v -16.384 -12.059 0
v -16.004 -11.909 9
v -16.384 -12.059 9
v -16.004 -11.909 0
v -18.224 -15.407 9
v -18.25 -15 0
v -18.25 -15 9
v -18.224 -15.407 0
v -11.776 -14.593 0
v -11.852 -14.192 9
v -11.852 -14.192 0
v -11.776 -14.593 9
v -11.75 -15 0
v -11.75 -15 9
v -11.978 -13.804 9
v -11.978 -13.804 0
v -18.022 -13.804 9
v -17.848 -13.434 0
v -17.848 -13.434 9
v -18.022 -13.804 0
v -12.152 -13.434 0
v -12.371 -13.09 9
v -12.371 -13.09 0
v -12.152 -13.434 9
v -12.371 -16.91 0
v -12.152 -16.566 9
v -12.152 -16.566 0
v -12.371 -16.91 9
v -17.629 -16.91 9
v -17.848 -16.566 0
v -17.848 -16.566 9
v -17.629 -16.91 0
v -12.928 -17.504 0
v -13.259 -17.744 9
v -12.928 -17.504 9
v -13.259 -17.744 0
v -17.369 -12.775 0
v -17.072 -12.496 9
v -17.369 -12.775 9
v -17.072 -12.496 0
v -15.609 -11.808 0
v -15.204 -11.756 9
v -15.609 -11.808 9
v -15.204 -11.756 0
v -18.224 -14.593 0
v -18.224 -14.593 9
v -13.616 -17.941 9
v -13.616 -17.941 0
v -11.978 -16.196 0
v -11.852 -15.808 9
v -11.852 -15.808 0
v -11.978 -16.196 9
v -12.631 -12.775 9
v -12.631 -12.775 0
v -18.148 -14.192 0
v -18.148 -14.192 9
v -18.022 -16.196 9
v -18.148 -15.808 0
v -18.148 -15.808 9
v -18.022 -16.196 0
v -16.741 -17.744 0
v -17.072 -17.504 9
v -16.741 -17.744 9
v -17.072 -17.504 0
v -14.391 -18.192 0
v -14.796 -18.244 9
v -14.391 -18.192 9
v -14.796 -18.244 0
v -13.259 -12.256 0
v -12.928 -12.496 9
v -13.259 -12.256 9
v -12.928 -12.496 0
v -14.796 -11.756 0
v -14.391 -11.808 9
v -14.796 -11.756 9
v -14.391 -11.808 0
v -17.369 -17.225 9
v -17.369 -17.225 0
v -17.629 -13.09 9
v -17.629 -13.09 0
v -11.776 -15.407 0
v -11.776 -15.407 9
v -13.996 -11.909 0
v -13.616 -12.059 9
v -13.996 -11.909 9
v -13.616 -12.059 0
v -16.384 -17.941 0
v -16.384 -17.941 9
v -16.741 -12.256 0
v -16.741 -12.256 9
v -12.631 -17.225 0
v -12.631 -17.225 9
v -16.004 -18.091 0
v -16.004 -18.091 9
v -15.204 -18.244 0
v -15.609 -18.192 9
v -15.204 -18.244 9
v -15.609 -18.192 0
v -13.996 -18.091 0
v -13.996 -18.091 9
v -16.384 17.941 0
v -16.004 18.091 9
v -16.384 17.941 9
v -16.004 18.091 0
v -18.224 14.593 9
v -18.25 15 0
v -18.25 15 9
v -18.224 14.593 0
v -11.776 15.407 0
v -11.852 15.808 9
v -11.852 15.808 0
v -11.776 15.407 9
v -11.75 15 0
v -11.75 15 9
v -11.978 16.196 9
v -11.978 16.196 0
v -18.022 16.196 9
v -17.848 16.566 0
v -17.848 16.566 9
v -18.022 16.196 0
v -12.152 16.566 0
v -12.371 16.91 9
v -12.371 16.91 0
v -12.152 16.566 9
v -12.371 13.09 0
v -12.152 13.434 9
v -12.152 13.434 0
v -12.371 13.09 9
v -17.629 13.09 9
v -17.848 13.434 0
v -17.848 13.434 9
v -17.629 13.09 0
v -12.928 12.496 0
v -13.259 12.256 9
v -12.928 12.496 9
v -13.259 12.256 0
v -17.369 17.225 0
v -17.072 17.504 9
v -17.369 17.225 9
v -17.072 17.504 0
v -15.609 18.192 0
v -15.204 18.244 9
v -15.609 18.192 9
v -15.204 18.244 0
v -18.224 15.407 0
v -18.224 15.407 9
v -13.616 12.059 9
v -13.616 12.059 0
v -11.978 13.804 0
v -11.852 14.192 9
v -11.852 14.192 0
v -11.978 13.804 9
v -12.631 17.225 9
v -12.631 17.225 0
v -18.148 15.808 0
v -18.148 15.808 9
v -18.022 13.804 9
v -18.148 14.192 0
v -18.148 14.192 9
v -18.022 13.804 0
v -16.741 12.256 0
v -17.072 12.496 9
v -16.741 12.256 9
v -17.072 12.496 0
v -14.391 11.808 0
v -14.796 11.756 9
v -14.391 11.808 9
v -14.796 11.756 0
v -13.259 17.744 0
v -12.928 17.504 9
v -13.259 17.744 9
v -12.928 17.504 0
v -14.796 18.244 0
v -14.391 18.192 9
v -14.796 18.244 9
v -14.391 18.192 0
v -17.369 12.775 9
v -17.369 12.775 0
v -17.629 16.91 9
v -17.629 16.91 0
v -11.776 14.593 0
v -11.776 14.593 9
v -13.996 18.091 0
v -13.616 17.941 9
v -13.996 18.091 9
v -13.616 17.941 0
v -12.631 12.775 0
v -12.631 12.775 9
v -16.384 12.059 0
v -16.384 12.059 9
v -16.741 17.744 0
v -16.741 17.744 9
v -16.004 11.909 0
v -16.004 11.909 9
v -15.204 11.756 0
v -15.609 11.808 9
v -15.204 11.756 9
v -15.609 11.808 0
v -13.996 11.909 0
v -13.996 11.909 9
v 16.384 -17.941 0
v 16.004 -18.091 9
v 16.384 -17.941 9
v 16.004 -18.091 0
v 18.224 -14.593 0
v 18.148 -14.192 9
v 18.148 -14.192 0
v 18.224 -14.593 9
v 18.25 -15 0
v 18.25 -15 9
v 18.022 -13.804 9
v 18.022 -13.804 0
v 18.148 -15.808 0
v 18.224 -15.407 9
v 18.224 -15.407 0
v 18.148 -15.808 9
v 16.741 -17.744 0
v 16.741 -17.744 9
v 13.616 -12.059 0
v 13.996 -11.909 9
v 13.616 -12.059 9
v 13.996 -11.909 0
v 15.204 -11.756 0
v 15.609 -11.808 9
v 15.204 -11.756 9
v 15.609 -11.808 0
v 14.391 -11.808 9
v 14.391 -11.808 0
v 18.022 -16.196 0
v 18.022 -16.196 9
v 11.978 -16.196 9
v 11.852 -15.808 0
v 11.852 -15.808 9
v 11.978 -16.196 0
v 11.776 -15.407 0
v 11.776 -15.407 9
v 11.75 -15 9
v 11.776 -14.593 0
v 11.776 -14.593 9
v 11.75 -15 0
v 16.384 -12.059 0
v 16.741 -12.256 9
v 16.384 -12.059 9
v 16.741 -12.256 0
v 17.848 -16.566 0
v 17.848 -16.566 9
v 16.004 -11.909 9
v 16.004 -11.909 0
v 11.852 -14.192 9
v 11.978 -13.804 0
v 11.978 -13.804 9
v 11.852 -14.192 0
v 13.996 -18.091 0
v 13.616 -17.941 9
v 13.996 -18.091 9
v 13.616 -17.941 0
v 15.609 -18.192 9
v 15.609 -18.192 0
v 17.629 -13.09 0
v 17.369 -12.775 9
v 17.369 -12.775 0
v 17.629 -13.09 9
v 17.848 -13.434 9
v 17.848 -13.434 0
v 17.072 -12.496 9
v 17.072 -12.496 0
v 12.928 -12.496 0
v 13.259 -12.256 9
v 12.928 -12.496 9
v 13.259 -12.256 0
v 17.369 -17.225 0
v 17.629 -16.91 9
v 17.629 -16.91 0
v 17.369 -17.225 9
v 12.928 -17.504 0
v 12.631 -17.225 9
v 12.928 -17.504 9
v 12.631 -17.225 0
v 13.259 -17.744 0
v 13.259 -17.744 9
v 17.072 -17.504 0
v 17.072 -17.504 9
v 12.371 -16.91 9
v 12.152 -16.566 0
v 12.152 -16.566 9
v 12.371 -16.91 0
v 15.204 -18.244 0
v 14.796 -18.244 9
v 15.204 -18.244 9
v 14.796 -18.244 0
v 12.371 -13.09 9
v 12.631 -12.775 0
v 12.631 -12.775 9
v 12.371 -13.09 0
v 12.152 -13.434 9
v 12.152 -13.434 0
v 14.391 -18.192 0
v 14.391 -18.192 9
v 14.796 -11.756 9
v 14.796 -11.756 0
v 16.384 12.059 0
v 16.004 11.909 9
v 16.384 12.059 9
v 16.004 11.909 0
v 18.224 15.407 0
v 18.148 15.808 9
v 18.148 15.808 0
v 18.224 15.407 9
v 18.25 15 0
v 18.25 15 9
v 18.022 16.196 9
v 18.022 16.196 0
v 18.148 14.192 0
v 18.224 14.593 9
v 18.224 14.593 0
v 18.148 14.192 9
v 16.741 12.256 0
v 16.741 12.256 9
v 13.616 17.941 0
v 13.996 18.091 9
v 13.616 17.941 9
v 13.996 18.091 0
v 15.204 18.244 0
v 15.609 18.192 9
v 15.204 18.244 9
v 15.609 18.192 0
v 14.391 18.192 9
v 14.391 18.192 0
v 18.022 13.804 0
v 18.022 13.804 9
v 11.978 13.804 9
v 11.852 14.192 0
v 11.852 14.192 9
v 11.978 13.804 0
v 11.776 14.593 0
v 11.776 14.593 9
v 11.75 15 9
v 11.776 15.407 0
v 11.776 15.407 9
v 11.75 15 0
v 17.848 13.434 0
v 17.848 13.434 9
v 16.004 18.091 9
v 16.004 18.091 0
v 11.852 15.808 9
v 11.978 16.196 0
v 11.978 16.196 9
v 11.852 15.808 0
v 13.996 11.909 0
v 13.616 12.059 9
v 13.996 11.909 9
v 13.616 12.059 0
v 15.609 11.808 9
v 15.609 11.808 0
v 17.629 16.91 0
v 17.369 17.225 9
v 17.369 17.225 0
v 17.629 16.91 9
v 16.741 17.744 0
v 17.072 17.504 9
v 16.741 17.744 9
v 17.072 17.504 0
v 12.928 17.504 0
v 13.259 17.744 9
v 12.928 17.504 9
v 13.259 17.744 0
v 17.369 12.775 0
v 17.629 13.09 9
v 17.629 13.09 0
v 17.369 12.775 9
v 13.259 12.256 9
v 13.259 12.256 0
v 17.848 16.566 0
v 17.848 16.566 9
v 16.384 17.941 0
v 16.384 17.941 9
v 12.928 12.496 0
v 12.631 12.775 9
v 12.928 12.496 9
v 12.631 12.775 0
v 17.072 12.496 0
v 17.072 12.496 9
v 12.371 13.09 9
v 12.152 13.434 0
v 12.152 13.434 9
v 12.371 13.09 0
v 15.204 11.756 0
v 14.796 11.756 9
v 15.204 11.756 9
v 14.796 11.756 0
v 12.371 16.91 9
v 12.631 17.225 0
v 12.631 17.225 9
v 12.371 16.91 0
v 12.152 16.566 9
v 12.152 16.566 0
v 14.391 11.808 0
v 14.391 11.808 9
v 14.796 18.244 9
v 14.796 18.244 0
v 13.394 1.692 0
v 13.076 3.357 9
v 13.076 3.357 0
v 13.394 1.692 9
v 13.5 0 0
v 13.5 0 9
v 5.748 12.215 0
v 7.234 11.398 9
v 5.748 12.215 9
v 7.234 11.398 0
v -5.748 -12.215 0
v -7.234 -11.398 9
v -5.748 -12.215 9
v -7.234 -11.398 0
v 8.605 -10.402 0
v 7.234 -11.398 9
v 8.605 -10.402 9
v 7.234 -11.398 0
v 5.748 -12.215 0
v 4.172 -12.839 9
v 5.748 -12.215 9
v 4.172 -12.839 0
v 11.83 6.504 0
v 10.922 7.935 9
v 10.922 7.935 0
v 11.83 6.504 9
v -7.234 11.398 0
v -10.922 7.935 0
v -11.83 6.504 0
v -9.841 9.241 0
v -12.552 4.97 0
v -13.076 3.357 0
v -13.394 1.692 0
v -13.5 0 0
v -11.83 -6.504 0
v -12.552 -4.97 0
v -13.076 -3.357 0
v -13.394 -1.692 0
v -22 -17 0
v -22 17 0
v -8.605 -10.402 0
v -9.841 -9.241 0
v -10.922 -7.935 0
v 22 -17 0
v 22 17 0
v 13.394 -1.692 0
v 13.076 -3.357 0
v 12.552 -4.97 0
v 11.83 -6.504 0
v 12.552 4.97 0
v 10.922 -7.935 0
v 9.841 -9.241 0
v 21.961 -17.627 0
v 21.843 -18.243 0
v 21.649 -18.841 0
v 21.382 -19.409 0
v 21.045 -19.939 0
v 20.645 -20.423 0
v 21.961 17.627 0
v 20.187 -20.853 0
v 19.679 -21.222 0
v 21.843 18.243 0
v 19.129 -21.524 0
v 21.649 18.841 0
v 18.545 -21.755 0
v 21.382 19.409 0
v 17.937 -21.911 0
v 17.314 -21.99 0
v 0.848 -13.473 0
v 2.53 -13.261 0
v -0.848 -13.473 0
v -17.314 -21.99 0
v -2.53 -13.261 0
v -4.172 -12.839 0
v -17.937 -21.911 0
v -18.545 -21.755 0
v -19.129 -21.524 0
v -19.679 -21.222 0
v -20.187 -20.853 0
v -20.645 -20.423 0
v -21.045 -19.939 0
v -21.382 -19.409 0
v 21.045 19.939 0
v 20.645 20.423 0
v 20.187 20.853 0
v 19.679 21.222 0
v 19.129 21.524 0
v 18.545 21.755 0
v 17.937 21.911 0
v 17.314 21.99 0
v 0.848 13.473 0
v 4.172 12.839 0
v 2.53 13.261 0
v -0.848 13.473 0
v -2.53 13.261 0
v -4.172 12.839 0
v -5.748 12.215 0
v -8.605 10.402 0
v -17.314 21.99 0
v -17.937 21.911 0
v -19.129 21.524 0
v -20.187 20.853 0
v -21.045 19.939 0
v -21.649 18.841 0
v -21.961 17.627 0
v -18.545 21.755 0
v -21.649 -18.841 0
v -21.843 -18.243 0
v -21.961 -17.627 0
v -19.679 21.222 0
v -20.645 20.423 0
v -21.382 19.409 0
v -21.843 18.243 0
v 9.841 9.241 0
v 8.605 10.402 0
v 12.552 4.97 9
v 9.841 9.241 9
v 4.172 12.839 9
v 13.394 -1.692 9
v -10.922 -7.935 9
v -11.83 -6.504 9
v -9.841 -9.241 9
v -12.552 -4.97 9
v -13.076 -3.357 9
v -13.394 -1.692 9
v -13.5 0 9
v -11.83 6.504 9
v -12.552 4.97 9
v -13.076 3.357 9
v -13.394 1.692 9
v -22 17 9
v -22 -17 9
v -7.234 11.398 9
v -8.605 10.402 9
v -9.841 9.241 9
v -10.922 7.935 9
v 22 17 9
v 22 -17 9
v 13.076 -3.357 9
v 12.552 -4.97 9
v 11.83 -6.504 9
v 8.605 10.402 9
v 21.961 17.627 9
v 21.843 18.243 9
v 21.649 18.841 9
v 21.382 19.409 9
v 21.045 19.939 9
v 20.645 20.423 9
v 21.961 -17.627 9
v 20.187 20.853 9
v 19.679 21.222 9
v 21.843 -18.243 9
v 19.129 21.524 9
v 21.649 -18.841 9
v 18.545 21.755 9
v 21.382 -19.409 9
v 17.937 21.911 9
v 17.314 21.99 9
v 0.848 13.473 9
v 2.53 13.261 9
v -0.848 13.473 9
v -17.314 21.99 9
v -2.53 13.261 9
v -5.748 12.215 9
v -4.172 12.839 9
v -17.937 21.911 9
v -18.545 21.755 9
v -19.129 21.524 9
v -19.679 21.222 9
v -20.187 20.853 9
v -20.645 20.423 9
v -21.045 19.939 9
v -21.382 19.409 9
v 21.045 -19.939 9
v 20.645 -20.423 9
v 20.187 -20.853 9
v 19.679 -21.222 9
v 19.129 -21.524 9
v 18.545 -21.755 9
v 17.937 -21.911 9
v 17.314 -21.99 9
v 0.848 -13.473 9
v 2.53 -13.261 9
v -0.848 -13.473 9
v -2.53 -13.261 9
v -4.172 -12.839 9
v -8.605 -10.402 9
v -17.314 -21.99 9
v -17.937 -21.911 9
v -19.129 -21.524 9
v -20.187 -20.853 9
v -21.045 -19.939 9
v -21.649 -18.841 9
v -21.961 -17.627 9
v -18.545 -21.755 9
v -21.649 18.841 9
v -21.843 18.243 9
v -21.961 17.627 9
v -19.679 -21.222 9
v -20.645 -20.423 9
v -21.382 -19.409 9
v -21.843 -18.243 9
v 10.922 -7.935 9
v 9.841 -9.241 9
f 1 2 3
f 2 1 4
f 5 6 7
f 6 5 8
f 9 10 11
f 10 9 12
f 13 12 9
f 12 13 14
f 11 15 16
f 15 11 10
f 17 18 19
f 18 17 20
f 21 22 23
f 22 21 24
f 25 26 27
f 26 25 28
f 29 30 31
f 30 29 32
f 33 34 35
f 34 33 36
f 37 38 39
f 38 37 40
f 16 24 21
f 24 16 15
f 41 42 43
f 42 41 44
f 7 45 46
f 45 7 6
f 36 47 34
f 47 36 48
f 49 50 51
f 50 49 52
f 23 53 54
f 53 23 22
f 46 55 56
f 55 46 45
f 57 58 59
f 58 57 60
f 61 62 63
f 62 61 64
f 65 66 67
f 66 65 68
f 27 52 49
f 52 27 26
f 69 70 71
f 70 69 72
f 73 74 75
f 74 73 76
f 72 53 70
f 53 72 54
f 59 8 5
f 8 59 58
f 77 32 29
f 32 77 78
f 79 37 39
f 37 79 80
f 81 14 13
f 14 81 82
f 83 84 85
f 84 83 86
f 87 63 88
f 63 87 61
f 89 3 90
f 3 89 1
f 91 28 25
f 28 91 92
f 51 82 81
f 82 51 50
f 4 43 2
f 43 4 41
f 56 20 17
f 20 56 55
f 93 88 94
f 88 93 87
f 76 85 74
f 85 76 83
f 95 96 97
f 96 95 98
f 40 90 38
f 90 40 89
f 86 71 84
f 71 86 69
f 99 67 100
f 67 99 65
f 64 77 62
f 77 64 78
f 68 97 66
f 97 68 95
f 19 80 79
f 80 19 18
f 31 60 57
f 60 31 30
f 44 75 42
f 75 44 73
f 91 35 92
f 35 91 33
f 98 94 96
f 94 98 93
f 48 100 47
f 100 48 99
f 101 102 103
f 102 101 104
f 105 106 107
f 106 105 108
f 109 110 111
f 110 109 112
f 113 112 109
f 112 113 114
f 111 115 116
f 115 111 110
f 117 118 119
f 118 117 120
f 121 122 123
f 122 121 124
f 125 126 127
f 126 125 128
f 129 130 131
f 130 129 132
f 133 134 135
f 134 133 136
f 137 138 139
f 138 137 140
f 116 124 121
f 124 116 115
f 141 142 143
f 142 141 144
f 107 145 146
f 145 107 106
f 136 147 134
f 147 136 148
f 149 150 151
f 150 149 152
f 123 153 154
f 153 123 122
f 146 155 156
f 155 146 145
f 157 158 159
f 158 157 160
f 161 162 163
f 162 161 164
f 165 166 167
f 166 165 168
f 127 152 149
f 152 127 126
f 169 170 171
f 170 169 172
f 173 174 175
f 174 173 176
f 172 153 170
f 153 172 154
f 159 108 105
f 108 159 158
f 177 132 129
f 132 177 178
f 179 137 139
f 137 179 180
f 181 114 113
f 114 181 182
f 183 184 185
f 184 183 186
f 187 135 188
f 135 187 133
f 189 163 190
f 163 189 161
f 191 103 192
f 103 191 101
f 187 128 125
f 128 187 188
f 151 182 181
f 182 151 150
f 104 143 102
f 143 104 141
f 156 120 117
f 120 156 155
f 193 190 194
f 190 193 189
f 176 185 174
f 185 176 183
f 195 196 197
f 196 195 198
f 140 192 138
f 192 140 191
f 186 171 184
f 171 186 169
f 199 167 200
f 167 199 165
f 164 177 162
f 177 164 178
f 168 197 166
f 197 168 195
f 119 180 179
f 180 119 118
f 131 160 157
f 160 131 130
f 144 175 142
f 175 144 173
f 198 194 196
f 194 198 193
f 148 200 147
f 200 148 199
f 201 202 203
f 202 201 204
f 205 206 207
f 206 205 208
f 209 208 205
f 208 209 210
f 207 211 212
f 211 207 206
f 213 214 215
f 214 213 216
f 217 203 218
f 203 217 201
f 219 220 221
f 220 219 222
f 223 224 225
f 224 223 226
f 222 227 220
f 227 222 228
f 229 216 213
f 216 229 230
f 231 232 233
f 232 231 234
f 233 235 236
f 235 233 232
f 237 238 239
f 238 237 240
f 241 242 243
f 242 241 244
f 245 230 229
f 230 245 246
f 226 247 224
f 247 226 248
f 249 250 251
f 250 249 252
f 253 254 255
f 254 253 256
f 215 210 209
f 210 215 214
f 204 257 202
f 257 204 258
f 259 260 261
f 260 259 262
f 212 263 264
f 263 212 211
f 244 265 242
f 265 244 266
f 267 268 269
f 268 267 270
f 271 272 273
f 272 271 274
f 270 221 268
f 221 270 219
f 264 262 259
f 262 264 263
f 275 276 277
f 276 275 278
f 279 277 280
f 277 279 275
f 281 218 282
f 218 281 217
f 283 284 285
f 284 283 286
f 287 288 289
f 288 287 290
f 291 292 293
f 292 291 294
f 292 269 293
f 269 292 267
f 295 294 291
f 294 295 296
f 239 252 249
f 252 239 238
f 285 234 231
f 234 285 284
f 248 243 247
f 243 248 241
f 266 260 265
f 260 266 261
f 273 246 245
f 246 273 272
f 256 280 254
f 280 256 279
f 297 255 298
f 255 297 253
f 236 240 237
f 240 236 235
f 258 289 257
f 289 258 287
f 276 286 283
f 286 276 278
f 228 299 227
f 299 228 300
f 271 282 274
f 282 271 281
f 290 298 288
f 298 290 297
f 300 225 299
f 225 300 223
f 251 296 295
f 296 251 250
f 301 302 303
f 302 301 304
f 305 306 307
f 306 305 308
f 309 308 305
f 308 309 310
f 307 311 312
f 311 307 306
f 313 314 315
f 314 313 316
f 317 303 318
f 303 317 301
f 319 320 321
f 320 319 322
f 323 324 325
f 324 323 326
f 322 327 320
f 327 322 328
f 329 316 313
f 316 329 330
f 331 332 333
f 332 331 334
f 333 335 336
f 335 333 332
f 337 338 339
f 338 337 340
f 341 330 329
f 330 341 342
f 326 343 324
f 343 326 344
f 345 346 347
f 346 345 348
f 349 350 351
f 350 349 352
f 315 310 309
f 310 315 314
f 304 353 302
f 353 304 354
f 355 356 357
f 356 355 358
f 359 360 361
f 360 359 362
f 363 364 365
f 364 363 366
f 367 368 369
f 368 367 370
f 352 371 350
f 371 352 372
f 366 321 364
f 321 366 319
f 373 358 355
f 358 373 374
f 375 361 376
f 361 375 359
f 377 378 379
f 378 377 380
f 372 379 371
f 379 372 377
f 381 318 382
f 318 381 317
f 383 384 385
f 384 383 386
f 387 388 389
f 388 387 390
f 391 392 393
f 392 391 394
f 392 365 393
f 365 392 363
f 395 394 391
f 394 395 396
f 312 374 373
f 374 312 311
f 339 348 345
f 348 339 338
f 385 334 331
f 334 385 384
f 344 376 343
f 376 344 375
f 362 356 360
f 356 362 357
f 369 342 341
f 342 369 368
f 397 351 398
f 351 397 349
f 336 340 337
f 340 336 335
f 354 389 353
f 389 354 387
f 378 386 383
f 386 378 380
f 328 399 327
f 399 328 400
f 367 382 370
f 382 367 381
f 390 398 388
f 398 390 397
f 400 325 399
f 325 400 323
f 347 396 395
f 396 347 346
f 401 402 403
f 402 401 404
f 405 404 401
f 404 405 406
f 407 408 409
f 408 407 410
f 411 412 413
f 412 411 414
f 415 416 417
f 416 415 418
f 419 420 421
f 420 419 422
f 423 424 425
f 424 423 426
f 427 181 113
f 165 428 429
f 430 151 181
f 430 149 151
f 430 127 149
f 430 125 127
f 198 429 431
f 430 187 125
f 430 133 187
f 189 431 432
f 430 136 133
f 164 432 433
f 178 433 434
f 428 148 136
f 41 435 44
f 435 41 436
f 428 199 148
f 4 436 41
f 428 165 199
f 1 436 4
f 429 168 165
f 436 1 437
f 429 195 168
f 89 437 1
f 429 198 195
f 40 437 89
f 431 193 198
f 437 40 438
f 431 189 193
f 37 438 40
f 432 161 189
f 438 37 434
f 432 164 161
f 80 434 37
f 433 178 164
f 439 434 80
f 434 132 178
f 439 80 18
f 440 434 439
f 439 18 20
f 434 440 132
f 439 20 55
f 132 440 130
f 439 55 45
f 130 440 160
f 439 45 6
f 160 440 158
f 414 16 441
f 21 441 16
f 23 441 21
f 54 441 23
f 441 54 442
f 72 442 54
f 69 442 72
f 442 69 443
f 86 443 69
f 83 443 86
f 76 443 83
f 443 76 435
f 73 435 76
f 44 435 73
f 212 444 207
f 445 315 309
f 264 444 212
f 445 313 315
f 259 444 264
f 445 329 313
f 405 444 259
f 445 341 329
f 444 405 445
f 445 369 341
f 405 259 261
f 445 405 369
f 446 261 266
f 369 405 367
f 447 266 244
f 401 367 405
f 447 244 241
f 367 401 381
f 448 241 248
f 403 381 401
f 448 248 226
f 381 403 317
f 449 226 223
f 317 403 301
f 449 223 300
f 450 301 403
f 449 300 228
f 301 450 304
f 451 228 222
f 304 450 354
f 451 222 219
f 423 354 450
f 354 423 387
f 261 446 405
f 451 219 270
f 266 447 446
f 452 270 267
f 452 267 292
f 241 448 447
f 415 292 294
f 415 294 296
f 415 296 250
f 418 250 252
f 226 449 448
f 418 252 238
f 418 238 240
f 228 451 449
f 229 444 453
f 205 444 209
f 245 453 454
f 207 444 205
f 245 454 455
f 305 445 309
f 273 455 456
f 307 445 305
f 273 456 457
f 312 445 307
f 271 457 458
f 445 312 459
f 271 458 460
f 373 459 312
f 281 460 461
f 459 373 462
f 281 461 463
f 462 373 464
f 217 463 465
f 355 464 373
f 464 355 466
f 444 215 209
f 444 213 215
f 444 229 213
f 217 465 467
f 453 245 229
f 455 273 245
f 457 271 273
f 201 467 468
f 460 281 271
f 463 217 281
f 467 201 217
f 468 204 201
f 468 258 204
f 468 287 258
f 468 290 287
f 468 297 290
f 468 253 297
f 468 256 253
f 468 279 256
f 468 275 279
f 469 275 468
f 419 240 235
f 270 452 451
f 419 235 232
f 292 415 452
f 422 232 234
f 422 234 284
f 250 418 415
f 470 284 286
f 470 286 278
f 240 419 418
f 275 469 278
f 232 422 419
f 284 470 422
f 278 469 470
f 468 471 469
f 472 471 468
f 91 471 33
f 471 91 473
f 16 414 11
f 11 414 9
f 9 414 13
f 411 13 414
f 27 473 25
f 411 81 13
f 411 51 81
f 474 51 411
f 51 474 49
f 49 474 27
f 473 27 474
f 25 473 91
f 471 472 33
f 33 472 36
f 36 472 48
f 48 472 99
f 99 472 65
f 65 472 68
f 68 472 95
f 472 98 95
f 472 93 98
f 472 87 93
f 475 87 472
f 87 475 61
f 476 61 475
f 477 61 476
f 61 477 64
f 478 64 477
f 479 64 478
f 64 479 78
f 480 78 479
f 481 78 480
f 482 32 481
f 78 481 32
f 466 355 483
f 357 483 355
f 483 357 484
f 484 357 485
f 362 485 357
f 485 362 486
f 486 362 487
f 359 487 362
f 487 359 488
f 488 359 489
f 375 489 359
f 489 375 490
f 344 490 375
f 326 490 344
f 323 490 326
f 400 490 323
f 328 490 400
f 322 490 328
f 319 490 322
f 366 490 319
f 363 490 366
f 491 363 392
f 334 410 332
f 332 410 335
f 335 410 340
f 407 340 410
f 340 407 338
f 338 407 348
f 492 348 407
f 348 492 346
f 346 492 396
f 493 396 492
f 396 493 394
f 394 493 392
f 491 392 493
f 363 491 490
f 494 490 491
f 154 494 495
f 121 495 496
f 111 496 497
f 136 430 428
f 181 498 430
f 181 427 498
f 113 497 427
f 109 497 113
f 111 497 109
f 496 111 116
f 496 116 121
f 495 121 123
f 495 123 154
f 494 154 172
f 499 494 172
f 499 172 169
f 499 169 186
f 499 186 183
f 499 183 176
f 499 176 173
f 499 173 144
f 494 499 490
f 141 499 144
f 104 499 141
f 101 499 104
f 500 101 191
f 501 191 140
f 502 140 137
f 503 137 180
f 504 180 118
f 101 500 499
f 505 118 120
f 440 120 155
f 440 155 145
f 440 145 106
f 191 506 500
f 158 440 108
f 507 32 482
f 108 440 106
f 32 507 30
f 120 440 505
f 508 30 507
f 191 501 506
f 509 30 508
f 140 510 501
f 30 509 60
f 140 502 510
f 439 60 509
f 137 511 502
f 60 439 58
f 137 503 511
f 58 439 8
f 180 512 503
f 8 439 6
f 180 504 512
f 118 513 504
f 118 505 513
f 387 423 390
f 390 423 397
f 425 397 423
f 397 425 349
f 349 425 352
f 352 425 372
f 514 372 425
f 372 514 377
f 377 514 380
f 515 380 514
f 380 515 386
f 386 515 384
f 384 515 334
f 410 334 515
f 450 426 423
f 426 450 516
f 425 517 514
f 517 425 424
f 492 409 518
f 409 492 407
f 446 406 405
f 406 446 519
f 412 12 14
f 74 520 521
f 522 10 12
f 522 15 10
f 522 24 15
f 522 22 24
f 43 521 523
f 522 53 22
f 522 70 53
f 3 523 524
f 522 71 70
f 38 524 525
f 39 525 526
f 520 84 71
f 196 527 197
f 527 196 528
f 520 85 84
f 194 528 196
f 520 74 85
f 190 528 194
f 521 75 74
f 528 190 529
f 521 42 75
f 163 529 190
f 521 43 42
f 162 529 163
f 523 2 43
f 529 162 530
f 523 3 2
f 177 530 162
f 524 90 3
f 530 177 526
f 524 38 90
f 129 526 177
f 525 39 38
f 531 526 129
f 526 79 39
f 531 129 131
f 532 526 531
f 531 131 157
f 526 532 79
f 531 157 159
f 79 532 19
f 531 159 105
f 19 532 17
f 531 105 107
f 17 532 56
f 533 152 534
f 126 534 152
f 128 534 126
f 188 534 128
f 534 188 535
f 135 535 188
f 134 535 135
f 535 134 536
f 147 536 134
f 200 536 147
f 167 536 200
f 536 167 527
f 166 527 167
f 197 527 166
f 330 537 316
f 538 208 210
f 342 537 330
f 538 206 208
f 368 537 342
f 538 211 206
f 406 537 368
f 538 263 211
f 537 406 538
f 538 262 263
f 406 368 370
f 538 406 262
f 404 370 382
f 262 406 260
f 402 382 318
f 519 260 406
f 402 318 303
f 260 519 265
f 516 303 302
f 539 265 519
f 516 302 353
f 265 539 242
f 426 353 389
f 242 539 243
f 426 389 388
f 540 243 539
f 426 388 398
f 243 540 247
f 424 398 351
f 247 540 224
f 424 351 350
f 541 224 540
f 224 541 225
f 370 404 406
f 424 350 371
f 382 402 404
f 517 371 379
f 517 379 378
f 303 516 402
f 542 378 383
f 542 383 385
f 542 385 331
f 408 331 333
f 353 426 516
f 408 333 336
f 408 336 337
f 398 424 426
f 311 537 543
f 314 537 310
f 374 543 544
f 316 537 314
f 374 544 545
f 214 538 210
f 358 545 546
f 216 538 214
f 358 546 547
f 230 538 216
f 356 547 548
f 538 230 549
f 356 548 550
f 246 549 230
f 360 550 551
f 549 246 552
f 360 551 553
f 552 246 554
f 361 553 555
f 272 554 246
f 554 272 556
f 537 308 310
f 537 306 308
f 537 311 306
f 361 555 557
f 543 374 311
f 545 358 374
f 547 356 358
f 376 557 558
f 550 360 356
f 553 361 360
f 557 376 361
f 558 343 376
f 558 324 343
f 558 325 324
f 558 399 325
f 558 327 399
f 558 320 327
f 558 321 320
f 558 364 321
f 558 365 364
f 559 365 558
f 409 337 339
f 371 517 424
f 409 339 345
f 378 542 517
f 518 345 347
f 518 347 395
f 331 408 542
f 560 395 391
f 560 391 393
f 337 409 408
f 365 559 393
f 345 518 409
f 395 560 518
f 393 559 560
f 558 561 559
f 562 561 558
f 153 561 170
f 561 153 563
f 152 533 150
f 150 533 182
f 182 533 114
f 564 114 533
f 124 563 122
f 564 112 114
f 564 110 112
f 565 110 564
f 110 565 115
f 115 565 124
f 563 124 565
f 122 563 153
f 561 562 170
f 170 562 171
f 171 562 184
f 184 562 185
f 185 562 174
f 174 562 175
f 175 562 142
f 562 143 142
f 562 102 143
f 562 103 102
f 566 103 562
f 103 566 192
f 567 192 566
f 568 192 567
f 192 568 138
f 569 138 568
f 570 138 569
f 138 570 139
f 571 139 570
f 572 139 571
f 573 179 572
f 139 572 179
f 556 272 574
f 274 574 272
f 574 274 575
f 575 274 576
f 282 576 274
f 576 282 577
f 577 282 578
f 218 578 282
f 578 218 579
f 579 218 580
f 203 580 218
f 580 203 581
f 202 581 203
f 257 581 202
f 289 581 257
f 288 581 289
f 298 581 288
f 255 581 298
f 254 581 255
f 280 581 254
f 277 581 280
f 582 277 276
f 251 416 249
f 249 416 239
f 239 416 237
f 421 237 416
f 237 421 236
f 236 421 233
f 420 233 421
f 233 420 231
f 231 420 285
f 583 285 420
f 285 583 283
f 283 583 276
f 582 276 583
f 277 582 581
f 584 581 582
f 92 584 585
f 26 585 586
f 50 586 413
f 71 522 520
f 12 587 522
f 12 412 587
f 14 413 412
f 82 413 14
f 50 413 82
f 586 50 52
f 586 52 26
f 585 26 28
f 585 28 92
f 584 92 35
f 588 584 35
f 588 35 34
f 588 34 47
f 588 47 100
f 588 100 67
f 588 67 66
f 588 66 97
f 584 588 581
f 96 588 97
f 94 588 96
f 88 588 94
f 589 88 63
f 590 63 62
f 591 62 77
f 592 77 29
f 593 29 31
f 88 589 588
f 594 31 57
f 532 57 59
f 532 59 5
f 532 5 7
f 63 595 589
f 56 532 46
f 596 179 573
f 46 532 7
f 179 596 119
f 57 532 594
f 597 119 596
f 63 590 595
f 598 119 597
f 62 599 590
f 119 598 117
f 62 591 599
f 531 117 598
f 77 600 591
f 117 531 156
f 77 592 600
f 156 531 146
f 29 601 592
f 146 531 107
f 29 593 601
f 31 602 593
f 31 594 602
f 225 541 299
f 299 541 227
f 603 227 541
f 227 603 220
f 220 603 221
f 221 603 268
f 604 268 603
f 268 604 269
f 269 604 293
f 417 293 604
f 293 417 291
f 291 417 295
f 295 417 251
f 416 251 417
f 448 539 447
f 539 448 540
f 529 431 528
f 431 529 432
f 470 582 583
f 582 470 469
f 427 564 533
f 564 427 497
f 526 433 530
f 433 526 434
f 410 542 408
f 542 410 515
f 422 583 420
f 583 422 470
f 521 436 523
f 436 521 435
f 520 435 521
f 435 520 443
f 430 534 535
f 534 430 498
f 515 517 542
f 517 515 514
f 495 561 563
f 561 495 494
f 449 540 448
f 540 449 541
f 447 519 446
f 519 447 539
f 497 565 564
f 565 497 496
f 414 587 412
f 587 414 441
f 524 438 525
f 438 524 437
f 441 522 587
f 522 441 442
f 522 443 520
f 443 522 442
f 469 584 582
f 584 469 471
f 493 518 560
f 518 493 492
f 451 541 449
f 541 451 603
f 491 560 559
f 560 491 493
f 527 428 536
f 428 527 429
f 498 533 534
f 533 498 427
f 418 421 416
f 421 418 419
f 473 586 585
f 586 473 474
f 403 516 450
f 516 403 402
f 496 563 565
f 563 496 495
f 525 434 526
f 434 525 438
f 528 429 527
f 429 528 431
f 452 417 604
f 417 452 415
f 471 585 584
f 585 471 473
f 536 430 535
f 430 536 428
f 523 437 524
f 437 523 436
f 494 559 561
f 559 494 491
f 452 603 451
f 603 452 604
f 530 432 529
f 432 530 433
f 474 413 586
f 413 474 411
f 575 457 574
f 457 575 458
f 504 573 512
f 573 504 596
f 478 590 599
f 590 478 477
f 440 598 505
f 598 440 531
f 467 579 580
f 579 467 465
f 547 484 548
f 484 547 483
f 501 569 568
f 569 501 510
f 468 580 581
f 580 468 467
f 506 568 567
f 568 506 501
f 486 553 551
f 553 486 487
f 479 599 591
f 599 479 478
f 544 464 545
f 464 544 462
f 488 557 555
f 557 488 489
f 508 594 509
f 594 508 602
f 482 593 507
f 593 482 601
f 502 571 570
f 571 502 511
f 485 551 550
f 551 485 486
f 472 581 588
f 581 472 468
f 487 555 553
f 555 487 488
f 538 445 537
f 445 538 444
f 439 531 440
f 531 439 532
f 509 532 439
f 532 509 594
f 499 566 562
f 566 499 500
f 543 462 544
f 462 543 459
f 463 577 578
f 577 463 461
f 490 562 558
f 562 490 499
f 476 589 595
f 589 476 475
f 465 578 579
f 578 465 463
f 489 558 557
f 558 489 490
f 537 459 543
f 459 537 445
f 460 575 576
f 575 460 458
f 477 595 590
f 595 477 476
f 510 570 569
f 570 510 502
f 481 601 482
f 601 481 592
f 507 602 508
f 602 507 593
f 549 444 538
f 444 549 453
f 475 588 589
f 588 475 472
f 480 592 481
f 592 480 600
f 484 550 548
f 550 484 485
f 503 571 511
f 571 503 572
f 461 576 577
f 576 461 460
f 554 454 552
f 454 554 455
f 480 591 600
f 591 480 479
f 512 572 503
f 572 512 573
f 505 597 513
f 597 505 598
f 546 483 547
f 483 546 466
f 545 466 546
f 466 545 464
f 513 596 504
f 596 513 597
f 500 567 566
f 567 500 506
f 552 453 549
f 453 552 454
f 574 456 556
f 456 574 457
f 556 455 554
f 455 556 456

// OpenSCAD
$fn = 50;


difference() {
	union() {
		hull() {
			translate(v = [-17.0000000000, 17.0000000000, 0]) {
				cylinder(h = 9, r = 5);
			}
			translate(v = [17.0000000000, 17.0000000000, 0]) {
				cylinder(h = 9, r = 5);
			}
			translate(v = [-17.0000000000, -17.0000000000, 0]) {
				cylinder(h = 9, r = 5);
			}
			translate(v = [17.0000000000, -17.0000000000, 0]) {
				cylinder(h = 9, r = 5);
			}
		}
	}
	union() {
		#translate(v = [-15.0000000000, -15.0000000000, -100.0000000000]) {
			cylinder(h = 200, r = 3.2500000000);
		}
		#translate(v = [-15.0000000000, 15.0000000000, -100.0000000000]) {
			cylinder(h = 200, r = 3.2500000000);
		}
		#translate(v = [15.0000000000, -15.0000000000, -100.0000000000]) {
			cylinder(h = 200, r = 3.2500000000);
		}
		#translate(v = [15.0000000000, 15.0000000000, -100.0000000000]) {
			cylinder(h = 200, r = 3.2500000000);
		}
		#cylinder(h = 9, r = 13.5000000000);
	}
}
